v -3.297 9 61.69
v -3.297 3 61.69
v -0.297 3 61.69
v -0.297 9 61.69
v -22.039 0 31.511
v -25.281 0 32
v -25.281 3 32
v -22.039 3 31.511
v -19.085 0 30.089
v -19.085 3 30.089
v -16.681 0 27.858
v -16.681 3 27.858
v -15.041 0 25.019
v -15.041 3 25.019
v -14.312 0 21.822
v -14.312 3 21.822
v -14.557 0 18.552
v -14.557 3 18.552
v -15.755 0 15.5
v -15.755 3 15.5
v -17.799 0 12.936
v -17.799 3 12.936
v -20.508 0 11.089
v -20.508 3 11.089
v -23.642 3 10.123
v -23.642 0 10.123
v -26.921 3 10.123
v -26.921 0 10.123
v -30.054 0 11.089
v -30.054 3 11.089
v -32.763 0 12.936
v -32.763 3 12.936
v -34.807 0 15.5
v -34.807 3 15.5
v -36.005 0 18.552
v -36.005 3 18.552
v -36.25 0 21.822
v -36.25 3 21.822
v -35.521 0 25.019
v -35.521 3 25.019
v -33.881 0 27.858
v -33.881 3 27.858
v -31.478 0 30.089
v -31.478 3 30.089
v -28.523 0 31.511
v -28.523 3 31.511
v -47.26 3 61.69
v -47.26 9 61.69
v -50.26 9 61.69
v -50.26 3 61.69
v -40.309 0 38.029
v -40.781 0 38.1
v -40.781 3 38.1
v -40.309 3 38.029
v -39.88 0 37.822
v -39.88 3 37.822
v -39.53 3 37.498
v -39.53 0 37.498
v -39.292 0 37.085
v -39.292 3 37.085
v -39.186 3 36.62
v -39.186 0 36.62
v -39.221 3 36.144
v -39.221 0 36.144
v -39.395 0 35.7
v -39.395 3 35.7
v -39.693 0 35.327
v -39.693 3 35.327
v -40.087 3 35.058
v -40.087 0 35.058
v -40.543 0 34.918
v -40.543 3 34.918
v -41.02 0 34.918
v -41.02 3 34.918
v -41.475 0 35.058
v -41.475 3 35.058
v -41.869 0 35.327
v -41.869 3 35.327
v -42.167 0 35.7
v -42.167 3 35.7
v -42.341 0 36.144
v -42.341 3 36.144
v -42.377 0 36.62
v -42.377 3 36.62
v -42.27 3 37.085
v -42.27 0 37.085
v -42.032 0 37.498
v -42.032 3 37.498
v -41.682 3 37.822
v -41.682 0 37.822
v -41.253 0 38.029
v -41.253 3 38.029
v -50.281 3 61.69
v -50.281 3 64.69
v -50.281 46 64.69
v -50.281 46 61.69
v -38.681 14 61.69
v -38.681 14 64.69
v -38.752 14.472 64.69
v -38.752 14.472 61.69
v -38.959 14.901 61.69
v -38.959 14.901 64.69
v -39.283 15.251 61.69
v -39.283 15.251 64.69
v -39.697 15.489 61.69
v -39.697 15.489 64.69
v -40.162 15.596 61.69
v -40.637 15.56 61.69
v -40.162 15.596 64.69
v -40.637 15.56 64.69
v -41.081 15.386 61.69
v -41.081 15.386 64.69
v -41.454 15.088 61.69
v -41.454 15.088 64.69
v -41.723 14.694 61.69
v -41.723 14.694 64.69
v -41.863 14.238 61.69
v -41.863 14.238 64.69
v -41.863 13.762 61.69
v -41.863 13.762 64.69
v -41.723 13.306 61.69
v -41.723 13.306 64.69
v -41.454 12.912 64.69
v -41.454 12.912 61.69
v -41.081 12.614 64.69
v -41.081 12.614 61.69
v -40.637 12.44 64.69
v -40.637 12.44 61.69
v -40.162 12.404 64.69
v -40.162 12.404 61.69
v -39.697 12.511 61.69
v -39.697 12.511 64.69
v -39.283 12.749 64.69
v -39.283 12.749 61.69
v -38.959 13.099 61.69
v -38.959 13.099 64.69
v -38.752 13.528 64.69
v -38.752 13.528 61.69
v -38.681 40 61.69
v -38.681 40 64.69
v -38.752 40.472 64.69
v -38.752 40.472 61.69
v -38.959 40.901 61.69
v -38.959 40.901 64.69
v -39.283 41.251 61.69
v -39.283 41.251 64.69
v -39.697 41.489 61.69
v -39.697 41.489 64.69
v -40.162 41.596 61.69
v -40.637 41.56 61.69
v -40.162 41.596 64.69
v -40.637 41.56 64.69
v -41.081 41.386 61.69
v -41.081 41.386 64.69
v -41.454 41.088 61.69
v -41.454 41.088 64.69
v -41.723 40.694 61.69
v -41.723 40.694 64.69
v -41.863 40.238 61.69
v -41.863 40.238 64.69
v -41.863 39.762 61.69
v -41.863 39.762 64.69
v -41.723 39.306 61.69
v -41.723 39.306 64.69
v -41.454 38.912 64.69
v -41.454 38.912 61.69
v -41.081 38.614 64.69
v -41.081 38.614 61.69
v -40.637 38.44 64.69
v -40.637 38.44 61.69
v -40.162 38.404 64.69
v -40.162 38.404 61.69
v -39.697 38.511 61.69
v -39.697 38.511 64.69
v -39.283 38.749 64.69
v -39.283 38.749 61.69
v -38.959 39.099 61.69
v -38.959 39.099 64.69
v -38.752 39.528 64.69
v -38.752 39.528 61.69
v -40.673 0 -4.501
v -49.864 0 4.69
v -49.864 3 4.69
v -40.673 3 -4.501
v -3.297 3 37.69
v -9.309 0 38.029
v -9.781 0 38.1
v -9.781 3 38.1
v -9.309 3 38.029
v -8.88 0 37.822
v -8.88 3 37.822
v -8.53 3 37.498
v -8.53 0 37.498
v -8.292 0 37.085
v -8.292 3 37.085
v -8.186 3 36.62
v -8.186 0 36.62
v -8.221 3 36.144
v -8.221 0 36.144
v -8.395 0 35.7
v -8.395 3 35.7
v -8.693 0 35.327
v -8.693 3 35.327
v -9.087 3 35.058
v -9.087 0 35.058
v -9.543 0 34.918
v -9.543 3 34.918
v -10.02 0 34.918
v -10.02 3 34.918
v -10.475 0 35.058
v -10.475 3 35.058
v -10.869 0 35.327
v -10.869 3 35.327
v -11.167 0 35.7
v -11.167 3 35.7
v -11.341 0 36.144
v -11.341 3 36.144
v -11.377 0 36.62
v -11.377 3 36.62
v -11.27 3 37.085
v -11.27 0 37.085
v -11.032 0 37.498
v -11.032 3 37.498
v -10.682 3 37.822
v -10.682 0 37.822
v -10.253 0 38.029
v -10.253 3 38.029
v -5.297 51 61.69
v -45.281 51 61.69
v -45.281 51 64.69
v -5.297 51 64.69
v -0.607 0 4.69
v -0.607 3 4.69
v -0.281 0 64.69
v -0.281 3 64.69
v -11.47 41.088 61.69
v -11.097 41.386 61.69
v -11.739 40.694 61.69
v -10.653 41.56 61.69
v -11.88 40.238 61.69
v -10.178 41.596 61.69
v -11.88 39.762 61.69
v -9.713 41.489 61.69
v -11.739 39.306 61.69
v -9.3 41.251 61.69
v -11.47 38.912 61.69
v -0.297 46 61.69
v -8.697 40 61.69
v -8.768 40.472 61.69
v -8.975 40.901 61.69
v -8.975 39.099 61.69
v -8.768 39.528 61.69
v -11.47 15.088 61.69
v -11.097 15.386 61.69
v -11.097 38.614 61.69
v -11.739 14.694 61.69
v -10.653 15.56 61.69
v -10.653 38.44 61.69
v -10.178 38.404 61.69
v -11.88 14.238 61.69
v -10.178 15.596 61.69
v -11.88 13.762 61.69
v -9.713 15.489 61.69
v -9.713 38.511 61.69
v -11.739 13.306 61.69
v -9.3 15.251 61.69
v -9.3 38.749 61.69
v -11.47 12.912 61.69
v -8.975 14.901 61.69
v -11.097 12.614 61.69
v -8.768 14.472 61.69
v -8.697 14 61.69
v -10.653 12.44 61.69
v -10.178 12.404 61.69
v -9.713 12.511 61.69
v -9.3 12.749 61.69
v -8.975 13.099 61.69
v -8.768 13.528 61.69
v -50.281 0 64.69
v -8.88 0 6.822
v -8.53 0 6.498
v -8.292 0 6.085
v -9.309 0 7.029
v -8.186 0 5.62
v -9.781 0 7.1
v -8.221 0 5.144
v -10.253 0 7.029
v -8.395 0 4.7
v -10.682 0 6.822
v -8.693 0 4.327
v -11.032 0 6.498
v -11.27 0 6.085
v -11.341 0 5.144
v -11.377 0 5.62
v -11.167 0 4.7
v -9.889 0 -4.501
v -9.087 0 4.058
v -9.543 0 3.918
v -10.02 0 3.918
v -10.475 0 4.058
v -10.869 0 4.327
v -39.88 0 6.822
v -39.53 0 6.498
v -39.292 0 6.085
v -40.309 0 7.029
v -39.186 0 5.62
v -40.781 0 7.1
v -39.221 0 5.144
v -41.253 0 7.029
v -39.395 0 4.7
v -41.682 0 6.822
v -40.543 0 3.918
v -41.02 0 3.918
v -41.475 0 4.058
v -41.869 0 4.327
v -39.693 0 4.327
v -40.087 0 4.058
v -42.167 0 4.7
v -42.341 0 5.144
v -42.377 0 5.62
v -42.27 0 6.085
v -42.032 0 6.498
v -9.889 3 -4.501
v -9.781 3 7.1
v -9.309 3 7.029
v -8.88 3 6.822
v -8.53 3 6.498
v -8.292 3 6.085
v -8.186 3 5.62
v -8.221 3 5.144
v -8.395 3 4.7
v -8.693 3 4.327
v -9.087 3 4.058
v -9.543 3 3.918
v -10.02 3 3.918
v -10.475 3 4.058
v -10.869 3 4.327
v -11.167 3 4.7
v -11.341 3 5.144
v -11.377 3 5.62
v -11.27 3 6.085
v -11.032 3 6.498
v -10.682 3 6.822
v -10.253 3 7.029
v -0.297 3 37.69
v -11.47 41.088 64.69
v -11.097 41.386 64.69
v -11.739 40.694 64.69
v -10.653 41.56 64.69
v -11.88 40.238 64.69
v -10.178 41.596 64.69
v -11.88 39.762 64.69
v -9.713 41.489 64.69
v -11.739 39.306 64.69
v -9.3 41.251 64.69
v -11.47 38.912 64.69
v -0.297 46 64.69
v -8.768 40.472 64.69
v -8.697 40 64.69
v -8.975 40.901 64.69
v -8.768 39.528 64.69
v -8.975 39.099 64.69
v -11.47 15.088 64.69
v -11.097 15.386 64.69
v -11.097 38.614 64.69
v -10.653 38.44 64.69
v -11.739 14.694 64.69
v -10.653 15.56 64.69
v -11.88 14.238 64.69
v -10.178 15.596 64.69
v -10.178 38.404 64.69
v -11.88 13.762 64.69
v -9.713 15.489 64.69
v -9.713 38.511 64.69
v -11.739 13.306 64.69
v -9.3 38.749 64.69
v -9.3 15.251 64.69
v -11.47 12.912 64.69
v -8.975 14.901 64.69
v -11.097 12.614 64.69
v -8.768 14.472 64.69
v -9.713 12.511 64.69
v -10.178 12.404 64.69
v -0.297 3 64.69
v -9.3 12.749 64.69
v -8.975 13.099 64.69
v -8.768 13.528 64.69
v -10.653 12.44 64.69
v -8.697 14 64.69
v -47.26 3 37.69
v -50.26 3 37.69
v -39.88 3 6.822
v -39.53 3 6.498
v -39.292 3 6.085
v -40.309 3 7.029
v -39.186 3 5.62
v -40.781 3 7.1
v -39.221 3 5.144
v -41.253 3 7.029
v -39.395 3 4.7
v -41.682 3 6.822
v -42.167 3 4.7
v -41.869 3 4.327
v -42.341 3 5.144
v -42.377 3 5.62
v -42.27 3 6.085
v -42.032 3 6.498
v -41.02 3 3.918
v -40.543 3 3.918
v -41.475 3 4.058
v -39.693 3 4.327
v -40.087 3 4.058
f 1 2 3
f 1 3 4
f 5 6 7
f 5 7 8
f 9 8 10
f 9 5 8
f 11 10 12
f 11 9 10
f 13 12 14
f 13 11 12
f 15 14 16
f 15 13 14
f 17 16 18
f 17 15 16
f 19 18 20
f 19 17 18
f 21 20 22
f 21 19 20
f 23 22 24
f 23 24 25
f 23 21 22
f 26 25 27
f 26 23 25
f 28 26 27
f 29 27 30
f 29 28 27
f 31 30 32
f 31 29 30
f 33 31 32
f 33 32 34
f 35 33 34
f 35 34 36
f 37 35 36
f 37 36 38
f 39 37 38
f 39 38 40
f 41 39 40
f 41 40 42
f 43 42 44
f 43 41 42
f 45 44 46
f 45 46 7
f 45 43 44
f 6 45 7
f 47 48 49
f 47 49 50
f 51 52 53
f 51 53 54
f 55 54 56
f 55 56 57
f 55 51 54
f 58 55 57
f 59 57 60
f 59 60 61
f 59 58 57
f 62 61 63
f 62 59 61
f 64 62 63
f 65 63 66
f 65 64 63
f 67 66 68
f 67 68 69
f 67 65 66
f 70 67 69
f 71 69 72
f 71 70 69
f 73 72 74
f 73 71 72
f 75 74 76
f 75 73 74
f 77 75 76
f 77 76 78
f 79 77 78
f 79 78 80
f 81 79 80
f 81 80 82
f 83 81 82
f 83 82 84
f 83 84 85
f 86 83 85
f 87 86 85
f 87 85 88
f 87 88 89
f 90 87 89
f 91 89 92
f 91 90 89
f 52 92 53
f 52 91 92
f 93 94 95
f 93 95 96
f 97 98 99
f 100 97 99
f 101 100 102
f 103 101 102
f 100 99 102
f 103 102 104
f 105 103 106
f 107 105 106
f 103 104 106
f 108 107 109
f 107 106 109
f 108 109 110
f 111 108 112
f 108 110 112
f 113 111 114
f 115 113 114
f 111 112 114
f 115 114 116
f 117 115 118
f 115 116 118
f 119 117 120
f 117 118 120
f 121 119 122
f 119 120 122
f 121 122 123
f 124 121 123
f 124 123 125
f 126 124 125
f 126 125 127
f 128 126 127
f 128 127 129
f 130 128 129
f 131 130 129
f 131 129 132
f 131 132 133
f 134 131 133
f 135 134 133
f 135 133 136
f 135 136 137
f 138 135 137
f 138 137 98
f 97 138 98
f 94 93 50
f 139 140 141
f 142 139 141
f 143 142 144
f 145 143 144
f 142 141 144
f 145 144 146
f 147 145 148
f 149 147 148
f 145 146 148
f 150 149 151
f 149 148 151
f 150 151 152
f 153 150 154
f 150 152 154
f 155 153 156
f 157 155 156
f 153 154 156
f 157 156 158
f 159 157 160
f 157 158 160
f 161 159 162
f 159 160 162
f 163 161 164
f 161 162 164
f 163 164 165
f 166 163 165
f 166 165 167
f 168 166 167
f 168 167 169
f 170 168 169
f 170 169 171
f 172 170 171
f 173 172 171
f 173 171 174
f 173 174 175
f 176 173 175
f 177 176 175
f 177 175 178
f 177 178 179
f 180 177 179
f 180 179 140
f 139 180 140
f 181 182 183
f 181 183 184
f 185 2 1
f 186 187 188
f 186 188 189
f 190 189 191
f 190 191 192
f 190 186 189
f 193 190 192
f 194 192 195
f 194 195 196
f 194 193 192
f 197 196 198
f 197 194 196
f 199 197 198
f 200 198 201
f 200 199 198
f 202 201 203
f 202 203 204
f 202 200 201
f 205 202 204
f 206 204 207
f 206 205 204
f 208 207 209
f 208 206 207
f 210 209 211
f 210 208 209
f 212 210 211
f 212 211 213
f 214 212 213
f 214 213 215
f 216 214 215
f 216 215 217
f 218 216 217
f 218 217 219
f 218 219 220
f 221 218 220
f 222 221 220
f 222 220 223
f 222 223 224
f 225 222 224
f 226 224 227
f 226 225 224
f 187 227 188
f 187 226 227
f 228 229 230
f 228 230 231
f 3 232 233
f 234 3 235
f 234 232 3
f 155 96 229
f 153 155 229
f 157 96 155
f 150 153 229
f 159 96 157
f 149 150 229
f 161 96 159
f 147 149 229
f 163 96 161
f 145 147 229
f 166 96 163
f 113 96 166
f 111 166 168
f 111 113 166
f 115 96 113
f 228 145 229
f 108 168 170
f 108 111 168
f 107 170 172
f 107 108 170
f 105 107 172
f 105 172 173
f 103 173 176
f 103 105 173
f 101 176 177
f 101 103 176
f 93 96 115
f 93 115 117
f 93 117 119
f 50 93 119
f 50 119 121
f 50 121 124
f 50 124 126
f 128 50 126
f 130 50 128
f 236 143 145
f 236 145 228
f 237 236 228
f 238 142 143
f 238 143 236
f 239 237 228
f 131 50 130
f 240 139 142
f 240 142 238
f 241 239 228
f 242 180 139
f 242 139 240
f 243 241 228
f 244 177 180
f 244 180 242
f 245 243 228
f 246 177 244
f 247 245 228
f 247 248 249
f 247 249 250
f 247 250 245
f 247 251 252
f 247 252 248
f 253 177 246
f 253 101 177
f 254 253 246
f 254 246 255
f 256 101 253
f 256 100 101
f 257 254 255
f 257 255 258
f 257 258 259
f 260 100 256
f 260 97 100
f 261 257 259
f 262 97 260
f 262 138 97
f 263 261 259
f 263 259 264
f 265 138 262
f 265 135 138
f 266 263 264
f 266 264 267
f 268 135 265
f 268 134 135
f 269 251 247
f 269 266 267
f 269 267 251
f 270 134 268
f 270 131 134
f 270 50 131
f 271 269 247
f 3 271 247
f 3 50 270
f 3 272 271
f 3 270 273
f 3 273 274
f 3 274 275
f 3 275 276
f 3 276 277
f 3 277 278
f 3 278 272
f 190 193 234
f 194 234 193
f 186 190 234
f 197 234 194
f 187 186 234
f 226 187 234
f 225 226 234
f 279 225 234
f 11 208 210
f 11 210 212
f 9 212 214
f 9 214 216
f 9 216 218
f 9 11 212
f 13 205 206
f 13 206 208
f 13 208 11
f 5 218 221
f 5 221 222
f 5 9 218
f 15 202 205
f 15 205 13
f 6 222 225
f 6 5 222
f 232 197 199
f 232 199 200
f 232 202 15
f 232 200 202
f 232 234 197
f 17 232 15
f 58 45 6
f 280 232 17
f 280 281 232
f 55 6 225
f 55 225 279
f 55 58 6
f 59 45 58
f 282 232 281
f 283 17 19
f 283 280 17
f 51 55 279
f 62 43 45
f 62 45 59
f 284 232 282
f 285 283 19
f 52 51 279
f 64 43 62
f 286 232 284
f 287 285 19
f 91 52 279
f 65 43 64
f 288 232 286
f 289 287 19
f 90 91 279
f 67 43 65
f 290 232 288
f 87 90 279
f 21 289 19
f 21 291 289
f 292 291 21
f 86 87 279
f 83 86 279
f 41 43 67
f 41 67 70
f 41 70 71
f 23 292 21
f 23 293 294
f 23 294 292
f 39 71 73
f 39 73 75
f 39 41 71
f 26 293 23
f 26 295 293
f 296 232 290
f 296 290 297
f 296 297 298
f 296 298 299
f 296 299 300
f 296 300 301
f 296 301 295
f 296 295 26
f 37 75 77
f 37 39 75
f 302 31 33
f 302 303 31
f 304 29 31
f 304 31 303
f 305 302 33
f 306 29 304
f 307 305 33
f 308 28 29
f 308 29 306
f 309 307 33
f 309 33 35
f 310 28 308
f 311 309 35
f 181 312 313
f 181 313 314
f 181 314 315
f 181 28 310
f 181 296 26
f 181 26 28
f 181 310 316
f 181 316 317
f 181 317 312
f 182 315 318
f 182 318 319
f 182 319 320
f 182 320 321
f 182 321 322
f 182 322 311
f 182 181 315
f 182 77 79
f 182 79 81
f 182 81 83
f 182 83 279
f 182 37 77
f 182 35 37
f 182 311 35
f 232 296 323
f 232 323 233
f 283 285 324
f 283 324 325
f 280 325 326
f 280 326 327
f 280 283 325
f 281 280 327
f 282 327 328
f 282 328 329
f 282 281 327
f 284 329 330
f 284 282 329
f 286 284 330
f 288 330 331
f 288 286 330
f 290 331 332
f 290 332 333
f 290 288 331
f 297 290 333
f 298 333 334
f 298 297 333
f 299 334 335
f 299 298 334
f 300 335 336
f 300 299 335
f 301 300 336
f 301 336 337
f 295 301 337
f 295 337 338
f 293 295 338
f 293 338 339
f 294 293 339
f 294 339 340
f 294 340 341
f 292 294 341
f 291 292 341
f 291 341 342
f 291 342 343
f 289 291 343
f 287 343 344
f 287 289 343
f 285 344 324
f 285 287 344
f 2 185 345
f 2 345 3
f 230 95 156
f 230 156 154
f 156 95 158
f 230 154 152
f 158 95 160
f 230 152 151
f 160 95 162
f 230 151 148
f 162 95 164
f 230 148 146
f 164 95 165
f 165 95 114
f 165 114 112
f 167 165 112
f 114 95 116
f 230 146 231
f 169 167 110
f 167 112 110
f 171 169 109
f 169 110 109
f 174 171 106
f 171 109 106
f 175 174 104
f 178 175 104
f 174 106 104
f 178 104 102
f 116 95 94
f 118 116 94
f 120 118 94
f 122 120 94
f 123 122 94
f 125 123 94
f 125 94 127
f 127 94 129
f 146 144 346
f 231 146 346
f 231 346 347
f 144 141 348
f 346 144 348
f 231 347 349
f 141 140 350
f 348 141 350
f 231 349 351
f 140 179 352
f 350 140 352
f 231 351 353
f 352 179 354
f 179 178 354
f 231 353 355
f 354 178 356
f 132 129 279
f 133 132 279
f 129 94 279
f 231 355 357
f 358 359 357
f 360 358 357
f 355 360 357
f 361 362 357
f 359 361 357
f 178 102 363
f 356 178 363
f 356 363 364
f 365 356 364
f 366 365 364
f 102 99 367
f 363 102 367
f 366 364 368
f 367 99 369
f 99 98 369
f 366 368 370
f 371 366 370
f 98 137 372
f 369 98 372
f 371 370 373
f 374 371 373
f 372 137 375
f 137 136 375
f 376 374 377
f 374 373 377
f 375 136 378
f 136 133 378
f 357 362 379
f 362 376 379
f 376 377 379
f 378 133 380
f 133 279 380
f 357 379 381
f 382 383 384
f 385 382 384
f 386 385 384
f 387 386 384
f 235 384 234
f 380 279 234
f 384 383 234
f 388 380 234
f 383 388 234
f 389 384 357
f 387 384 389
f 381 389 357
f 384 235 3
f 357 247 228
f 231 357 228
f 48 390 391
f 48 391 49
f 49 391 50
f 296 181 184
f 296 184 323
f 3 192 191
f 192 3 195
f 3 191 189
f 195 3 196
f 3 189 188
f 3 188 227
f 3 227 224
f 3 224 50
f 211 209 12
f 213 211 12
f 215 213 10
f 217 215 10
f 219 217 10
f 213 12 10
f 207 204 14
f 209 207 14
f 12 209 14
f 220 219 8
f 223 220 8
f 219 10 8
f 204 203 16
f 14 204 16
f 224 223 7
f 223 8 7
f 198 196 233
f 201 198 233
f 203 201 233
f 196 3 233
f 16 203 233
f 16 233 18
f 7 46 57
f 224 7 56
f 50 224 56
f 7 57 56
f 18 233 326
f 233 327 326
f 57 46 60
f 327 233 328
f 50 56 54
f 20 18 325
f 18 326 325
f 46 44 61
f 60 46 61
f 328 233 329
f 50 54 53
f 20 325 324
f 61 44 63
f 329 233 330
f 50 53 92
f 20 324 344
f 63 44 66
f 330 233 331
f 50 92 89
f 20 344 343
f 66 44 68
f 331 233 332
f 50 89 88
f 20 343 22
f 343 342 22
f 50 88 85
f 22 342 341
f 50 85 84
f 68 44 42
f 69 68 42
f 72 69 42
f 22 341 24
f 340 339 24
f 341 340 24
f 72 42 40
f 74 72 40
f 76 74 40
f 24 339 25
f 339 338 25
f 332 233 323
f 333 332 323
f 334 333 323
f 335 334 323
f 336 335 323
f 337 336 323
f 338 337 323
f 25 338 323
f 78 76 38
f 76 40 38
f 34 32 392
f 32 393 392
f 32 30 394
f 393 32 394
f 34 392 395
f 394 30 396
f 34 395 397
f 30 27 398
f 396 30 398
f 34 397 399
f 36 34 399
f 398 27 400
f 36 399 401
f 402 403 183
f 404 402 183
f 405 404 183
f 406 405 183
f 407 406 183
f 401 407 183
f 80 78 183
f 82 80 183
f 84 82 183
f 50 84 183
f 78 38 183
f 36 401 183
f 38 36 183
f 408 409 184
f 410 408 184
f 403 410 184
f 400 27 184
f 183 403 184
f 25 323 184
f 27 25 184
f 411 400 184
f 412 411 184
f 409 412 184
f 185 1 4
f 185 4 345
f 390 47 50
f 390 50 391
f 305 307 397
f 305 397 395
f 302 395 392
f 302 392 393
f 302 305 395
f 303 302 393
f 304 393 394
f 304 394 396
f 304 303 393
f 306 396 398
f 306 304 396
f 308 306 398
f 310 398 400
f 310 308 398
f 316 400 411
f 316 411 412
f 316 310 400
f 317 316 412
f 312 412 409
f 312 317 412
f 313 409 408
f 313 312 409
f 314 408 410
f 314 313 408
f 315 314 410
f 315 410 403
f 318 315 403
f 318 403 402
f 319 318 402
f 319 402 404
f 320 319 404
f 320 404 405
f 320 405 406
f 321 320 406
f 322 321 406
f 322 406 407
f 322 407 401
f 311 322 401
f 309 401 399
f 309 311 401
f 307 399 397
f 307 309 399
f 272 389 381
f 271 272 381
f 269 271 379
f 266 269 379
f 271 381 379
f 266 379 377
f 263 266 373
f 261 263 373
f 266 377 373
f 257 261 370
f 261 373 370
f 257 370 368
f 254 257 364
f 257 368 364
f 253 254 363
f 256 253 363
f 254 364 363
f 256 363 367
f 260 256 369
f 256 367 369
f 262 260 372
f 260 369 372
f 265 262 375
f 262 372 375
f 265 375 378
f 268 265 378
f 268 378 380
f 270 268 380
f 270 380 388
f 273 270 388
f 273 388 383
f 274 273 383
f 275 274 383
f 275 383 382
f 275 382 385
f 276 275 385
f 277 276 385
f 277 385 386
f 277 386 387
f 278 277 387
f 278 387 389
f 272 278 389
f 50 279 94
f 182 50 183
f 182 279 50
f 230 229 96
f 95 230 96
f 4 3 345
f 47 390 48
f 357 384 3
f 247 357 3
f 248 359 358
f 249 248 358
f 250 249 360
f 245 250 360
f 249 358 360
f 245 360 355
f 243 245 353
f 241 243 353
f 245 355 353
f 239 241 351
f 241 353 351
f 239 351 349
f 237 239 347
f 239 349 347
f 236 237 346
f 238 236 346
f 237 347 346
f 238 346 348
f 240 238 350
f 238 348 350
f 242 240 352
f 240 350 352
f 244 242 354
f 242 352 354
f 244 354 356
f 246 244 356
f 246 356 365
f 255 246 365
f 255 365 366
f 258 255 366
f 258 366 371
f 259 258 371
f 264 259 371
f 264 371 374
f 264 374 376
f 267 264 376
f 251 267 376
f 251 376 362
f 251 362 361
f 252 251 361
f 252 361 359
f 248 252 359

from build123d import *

# Parameters (mm, degrees)
SKETCH2_R                      = 11
SKETCH2_R_2                    = 1.6
BOSS_EXTRUDE1_DEPTH            = 3
SKETCH4_W                      = 49.983681894
SKETCH4_H                      = 3
BOSS_EXTRUDE2_DEPTH            = 48
CUT_EXTRUDE1_DEPTH             = 8
F_3_2_3_2_DIAMETER_HOLE1_D     = 3.2
F_3_2_3_2_DIAMETER_HOLE1_DEPTH = 3.2
F_3_2_3_2_DIAMETER_HOLE1_TIP   = 0.96137699
GUSSET1_THICKNESS              = 3
GUSSET2_THICKNESS              = 3


with BuildPart() as part:
    # Sketch2 → Boss-Extrude1 (new body)
    with BuildSketch(Plane(origin=(0, 0, 0), x_dir=(1, 0, 0), z_dir=(0, 1, 0))):
        Polygon((-0.281070854, -64.689517544), (-50.281070854, -64.689517544), (-49.863685081, -4.690081702), (-40.672742725, 4.500860654), (-9.889398982, 4.500860654), (-0.607432979, -4.689517544), align=None)
        with Locations(Location((-25.281070854, -21, 0), (0, 0, 270))):
            Circle(SKETCH2_R, mode=Mode.SUBTRACT)
        with Locations(Location((-40.781070854, -5.5, 0), (0, 0, 270))):
            Circle(SKETCH2_R_2, mode=Mode.SUBTRACT)
        with Locations(Location((-9.781070854, -5.5, 0), (0, 0, 270))):
            Circle(SKETCH2_R_2, mode=Mode.SUBTRACT)
        with Locations(Location((-40.781070854, -36.5, 0), (0, 0, 270))):
            Circle(SKETCH2_R_2, mode=Mode.SUBTRACT)
        with Locations(Location((-9.781070854, -36.5, 0), (0, 0, 270))):
            Circle(SKETCH2_R_2, mode=Mode.SUBTRACT)
    extrude(amount=BOSS_EXTRUDE1_DEPTH)

    # Sketch4 → Boss-Extrude2 (add)
    with BuildSketch(Plane(origin=(0, 3, 0), x_dir=(1, 0, 0), z_dir=(0, 1, 0))):
        with Locations((-25.289229907, -63.189517544)):
            Rectangle(SKETCH4_W, SKETCH4_H)
    extrude(amount=BOSS_EXTRUDE2_DEPTH)

    # Sketch5 → Cut-Extrude1 (cut)
    with BuildSketch(Plane(origin=(0, 0, 61.689517544), x_dir=(-1, 0, 0), z_dir=(0, 0, -1))):
        Polygon((0.29738896, 51), (0.29738896, 46), (5.29738896, 51), align=None)
        Polygon((50.281070854, 51), (45.281070854, 51), (50.281070854, 46), align=None)
    extrude(amount=-CUT_EXTRUDE1_DEPTH, mode=Mode.SUBTRACT)

    # Ø3.2 (3.2) Diameter Hole1
    with Locations(Plane(origin=(0, 0, 61.689517544), x_dir=(-1, 0, 0), z_dir=(0, 0, -1))):
        with Locations((10.29738896, 40), (40.281070854, 40), (40.281070854, 14), (10.29738896, 14)):
            Hole(F_3_2_3_2_DIAMETER_HOLE1_D / 2, depth=F_3_2_3_2_DIAMETER_HOLE1_DEPTH)
            with Locations((0, 0, -(F_3_2_3_2_DIAMETER_HOLE1_DEPTH + F_3_2_3_2_DIAMETER_HOLE1_TIP / 2))):  # 118° drill point
                Cone(0, F_3_2_3_2_DIAMETER_HOLE1_D / 2, F_3_2_3_2_DIAMETER_HOLE1_TIP, mode=Mode.SUBTRACT)


with BuildPart() as body_2:
    # Gusset1: a gusset: a plate 3.0 thick in the corner of two members, its outline drawn in place
    gusset1_outline = Wire([Line((-47.260201369, 3, 61.689517544), (-47.260201369, 3, 37.689517544)), Line((-47.260201369, 3, 37.689517544), (-47.260201369, 9, 61.689517544)), Line((-47.260201369, 9, 61.689517544), (-47.260201369, 3, 61.689517544))])
    add(extrude(Face(gusset1_outline), amount=GUSSET1_THICKNESS, dir=(-1, 0, 0)))


with BuildPart() as body_3:
    # Gusset2: a gusset: a plate 3.0 thick in the corner of two members, its outline drawn in place
    gusset2_outline = Wire([Line((-3.29738896, 3, 61.689517544), (-3.29738896, 9, 61.689517544)), Line((-3.29738896, 9, 61.689517544), (-3.29738896, 3, 37.689517544)), Line((-3.29738896, 3, 37.689517544), (-3.29738896, 3, 61.689517544))])
    add(extrude(Face(gusset2_outline), amount=GUSSET2_THICKNESS, dir=(1, 0, 0)))


solid = Compound([part.part, body_2.part, body_3.part])
